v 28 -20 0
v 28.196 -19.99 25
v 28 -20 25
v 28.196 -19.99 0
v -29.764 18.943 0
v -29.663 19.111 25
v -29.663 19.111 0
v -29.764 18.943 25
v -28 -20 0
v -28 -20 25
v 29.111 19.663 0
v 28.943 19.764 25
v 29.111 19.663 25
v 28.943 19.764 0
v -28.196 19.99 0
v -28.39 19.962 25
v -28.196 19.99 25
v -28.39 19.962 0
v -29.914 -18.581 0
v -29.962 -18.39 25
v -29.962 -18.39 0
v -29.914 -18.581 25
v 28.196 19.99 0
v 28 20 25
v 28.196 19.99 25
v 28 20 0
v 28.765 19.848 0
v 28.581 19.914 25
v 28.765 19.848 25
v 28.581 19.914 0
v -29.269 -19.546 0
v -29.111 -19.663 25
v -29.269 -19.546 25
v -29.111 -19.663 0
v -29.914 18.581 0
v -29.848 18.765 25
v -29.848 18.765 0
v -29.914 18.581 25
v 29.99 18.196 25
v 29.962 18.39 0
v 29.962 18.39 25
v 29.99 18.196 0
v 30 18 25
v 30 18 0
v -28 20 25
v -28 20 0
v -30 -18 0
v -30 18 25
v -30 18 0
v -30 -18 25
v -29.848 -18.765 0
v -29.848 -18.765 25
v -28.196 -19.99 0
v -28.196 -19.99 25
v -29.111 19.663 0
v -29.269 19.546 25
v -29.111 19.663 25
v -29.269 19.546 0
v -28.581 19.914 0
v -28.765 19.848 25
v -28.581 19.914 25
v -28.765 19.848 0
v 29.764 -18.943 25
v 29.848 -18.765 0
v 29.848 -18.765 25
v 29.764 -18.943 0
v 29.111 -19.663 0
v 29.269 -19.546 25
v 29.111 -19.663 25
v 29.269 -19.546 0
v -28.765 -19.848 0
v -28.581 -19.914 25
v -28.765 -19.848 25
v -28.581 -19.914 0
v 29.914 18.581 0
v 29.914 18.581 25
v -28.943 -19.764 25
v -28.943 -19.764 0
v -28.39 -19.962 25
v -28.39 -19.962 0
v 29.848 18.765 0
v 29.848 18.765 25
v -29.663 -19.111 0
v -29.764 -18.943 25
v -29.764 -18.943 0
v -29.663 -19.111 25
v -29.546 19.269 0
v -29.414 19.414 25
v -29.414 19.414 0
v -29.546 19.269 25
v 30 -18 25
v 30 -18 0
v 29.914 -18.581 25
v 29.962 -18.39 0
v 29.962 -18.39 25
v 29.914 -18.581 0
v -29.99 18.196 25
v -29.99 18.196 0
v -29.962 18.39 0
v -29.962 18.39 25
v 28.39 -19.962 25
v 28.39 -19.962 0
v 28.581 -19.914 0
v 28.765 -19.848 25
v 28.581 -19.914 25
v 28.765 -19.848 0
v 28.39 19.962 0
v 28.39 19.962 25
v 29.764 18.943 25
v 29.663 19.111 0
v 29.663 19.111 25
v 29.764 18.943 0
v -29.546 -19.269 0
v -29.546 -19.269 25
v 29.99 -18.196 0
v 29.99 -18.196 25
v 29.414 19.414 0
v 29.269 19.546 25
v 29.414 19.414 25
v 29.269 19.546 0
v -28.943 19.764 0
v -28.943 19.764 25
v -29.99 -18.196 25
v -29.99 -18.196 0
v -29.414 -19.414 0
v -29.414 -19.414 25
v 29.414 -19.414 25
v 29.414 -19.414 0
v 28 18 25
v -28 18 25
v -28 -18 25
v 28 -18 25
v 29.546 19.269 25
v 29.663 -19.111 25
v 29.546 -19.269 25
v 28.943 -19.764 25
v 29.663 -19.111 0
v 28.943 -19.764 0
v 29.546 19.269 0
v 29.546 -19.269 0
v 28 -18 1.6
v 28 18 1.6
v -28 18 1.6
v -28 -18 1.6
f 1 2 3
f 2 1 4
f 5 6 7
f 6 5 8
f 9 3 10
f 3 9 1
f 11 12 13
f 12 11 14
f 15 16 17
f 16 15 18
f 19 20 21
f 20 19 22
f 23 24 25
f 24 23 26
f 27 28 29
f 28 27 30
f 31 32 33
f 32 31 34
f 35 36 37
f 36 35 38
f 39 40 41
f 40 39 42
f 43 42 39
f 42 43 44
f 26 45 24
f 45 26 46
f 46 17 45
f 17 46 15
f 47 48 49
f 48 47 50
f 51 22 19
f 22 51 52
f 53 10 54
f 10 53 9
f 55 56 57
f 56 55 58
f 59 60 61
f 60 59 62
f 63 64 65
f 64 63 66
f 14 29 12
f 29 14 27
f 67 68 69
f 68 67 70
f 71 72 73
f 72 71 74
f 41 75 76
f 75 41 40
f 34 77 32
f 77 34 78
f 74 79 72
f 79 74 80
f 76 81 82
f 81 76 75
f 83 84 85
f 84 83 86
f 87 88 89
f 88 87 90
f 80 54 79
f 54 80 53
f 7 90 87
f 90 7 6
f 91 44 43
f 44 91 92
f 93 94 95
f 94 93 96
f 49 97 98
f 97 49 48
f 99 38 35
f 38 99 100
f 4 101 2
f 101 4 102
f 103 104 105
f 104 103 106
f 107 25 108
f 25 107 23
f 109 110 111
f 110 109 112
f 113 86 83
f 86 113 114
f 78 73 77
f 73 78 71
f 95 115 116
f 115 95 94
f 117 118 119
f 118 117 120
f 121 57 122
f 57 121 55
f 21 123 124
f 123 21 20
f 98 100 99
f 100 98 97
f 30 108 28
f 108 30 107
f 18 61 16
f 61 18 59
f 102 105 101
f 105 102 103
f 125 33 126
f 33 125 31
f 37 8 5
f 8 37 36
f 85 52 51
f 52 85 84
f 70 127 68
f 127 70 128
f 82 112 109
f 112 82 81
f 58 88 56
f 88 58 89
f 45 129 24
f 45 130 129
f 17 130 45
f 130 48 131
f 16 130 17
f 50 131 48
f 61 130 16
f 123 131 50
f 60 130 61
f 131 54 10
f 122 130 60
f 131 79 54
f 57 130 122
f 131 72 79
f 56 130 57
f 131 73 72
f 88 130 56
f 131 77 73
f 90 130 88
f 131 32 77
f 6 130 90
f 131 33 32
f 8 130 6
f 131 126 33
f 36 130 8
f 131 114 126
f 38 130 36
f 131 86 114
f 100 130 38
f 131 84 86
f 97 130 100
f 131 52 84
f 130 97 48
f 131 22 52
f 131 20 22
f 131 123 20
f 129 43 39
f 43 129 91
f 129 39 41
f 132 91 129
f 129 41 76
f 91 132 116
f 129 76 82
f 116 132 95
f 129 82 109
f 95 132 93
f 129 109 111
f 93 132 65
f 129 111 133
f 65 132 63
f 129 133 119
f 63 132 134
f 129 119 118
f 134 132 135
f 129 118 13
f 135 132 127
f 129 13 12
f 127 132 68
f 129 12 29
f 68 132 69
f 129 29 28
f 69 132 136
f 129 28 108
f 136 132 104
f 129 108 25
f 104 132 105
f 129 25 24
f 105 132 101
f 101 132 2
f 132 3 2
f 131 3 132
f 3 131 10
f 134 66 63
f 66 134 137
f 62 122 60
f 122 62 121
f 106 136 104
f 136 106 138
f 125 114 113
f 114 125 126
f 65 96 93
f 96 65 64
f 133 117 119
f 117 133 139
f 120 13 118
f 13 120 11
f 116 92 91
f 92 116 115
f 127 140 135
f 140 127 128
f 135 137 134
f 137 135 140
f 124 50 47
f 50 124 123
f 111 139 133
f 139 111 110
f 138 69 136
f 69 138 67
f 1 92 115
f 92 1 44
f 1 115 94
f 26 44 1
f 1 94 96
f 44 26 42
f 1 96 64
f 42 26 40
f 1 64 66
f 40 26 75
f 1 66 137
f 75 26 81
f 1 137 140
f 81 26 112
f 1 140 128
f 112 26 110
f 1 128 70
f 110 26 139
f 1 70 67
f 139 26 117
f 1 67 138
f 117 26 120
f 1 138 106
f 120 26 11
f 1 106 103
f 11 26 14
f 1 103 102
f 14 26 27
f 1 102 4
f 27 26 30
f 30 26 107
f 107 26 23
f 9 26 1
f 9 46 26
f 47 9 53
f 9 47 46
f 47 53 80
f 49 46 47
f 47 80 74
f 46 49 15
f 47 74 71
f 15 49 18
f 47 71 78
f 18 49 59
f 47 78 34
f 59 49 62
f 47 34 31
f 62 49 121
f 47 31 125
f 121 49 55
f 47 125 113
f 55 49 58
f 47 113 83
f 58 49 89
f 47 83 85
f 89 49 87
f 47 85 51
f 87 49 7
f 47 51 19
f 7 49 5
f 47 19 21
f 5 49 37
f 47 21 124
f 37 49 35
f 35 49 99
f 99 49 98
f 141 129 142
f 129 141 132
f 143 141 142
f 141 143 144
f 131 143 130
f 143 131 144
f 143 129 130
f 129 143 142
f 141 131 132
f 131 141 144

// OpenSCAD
// parametric-box.scad — a print-ready parametric box with a friction-fit lid.
//
// A reference for GOOD parametric OpenSCAD:
//   * every dimension is a named, Customizer-annotated parameter (top of file)
//   * a single `clearance` variable drives every mating fit (tune once, per printer)
//   * geometry is built from small, reusable modules
//   * walls/floor respect the 0.4 mm-nozzle minimums (>= 0.8 mm)
//   * units are millimeters; Z is up; the part sits on the bed (z = 0)
//
// Render:  openscad -o box.stl -D 'part="box"'  parametric-box.scad
//          openscad -o lid.stl -D 'part="lid"'  parametric-box.scad
//   or use the bundled render.sh / scad_params.py batch tool.

/* [What to render] */
// Which piece to export
part = "box";          // [box, lid, both]

/* [Outer size (mm)] */
width  = 60;           // [20:200]   outer X
depth  = 40;           // [20:200]   outer Y
height = 25;           // [10:150]   outer Z (box body, excluding lid)

/* [Walls & fit] */
wall   = 2.0;          // [0.8:0.2:4]  side wall thickness (>= 2x nozzle)
floor  = 1.6;          // [0.8:0.2:4]  floor/ceiling thickness
// Per-side gap between lid and box. 0.15-0.25 snug, 0.3-0.4 loose. Print a test!
clearance = 0.2;       // [0.05:0.05:0.6]
lid_height = 8;        // [4:40]     how deep the lid skirt is
round_r = 2;           // [0:0.5:10]  corner rounding radius (0 = sharp)

/* [Quality] */
// Facets per circle. 32 fast/draft, 64 good, 128 smooth. Higher = slower + bigger.
fn = 64;               // [16:8:160]

/* [Hidden] */
$fn = fn;
eps = 0.01;            // tiny overlap to keep booleans manifold

// ---- reusable geometry --------------------------------------------------------
// A rounded rectangular prism sitting on the bed (min z = 0).
module rbox(x, y, z, r) {
    if (r <= 0) {
        translate([-x/2, -y/2, 0]) cube([x, y, z]);
    } else {
        linear_extrude(z)
            offset(r) offset(-r)         // round outer corners
                square([x, y], center=true);
    }
}

// Hollow shell: outer rbox minus an inner cavity, leaving `wall` sides + `floor` base.
module box_body() {
    difference() {
        rbox(width, depth, height, round_r);
        translate([0, 0, floor])
            rbox(width - 2*wall, depth - 2*wall, height, max(0, round_r - wall));
    }
}

// Lid: a cap whose inner skirt slips over the box outer wall with `clearance` per side.
module lid() {
    skirt_in  = width  + 2*clearance;          // inner span hugs the box outside
    skirt_in2 = depth  + 2*clearance;
    difference() {
        rbox(skirt_in + 2*wall, skirt_in2 + 2*wall, lid_height + floor, round_r);
        translate([0, 0, floor])
            rbox(skirt_in, skirt_in2, lid_height + eps, max(0, round_r - wall));
    }
}

// ---- output -------------------------------------------------------------------
if (part == "box") box_body();
else if (part == "lid") lid();
else {                                          // both, side by side on the plate
    translate([-(width/2 + 5), 0, 0]) box_body();
    translate([ (width/2 + 5 + wall + clearance), 0, 0]) lid();
}
